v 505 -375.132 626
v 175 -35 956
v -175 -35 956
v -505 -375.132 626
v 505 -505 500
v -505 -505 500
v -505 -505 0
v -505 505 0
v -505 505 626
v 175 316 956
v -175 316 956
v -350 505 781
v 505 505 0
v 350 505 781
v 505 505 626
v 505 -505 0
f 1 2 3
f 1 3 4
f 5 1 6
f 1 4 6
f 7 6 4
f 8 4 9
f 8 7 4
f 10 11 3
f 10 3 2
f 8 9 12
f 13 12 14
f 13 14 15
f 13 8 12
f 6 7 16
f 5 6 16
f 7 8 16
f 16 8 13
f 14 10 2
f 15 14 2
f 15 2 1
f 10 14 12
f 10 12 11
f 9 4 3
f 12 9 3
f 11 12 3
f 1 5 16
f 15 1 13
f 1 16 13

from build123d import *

# Parameters (mm, degrees)
F0_W     = 1010
F0_H     = 1010
F1_DEPTH = 956
F3_DEPTH = 1010
F4_DEPTH = 1010
F6_DEPTH = 1010


with BuildPart() as f1:
    # F0 (on Top) → F1 (new body)
    with BuildSketch(Plane.XY):
        Rectangle(F0_W, F0_H)
    extrude(amount=F1_DEPTH)

    # F2 (on face) → F3 (cut)
    with BuildSketch(Plane(origin=(-505, 0, 0), x_dir=(0, -1, 0), z_dir=(-1, 0, 0))):
        Polygon((-505, 956), (-505, 781), (-316, 956), align=None)
    extrude(amount=-F3_DEPTH, mode=Mode.SUBTRACT)

    # F2 (on face) → F4 (cut)
    with BuildSketch(Plane(origin=(-505, 0, 0), x_dir=(0, -1, 0), z_dir=(-1, 0, 0))):
        Polygon((505, 956), (35, 956), (505, 500), align=None)
    extrude(amount=-F4_DEPTH, mode=Mode.SUBTRACT)

    # F5 (on face) → F6 (cut)
    with BuildSketch(Plane.XZ.offset(505)):
        Polygon((-505, 626), (-175, 956), (-505, 956), align=None)
        Polygon((505, 626), (505, 956), (175, 956), align=None)
    extrude(amount=-F6_DEPTH, mode=Mode.SUBTRACT)


solid = f1.part
